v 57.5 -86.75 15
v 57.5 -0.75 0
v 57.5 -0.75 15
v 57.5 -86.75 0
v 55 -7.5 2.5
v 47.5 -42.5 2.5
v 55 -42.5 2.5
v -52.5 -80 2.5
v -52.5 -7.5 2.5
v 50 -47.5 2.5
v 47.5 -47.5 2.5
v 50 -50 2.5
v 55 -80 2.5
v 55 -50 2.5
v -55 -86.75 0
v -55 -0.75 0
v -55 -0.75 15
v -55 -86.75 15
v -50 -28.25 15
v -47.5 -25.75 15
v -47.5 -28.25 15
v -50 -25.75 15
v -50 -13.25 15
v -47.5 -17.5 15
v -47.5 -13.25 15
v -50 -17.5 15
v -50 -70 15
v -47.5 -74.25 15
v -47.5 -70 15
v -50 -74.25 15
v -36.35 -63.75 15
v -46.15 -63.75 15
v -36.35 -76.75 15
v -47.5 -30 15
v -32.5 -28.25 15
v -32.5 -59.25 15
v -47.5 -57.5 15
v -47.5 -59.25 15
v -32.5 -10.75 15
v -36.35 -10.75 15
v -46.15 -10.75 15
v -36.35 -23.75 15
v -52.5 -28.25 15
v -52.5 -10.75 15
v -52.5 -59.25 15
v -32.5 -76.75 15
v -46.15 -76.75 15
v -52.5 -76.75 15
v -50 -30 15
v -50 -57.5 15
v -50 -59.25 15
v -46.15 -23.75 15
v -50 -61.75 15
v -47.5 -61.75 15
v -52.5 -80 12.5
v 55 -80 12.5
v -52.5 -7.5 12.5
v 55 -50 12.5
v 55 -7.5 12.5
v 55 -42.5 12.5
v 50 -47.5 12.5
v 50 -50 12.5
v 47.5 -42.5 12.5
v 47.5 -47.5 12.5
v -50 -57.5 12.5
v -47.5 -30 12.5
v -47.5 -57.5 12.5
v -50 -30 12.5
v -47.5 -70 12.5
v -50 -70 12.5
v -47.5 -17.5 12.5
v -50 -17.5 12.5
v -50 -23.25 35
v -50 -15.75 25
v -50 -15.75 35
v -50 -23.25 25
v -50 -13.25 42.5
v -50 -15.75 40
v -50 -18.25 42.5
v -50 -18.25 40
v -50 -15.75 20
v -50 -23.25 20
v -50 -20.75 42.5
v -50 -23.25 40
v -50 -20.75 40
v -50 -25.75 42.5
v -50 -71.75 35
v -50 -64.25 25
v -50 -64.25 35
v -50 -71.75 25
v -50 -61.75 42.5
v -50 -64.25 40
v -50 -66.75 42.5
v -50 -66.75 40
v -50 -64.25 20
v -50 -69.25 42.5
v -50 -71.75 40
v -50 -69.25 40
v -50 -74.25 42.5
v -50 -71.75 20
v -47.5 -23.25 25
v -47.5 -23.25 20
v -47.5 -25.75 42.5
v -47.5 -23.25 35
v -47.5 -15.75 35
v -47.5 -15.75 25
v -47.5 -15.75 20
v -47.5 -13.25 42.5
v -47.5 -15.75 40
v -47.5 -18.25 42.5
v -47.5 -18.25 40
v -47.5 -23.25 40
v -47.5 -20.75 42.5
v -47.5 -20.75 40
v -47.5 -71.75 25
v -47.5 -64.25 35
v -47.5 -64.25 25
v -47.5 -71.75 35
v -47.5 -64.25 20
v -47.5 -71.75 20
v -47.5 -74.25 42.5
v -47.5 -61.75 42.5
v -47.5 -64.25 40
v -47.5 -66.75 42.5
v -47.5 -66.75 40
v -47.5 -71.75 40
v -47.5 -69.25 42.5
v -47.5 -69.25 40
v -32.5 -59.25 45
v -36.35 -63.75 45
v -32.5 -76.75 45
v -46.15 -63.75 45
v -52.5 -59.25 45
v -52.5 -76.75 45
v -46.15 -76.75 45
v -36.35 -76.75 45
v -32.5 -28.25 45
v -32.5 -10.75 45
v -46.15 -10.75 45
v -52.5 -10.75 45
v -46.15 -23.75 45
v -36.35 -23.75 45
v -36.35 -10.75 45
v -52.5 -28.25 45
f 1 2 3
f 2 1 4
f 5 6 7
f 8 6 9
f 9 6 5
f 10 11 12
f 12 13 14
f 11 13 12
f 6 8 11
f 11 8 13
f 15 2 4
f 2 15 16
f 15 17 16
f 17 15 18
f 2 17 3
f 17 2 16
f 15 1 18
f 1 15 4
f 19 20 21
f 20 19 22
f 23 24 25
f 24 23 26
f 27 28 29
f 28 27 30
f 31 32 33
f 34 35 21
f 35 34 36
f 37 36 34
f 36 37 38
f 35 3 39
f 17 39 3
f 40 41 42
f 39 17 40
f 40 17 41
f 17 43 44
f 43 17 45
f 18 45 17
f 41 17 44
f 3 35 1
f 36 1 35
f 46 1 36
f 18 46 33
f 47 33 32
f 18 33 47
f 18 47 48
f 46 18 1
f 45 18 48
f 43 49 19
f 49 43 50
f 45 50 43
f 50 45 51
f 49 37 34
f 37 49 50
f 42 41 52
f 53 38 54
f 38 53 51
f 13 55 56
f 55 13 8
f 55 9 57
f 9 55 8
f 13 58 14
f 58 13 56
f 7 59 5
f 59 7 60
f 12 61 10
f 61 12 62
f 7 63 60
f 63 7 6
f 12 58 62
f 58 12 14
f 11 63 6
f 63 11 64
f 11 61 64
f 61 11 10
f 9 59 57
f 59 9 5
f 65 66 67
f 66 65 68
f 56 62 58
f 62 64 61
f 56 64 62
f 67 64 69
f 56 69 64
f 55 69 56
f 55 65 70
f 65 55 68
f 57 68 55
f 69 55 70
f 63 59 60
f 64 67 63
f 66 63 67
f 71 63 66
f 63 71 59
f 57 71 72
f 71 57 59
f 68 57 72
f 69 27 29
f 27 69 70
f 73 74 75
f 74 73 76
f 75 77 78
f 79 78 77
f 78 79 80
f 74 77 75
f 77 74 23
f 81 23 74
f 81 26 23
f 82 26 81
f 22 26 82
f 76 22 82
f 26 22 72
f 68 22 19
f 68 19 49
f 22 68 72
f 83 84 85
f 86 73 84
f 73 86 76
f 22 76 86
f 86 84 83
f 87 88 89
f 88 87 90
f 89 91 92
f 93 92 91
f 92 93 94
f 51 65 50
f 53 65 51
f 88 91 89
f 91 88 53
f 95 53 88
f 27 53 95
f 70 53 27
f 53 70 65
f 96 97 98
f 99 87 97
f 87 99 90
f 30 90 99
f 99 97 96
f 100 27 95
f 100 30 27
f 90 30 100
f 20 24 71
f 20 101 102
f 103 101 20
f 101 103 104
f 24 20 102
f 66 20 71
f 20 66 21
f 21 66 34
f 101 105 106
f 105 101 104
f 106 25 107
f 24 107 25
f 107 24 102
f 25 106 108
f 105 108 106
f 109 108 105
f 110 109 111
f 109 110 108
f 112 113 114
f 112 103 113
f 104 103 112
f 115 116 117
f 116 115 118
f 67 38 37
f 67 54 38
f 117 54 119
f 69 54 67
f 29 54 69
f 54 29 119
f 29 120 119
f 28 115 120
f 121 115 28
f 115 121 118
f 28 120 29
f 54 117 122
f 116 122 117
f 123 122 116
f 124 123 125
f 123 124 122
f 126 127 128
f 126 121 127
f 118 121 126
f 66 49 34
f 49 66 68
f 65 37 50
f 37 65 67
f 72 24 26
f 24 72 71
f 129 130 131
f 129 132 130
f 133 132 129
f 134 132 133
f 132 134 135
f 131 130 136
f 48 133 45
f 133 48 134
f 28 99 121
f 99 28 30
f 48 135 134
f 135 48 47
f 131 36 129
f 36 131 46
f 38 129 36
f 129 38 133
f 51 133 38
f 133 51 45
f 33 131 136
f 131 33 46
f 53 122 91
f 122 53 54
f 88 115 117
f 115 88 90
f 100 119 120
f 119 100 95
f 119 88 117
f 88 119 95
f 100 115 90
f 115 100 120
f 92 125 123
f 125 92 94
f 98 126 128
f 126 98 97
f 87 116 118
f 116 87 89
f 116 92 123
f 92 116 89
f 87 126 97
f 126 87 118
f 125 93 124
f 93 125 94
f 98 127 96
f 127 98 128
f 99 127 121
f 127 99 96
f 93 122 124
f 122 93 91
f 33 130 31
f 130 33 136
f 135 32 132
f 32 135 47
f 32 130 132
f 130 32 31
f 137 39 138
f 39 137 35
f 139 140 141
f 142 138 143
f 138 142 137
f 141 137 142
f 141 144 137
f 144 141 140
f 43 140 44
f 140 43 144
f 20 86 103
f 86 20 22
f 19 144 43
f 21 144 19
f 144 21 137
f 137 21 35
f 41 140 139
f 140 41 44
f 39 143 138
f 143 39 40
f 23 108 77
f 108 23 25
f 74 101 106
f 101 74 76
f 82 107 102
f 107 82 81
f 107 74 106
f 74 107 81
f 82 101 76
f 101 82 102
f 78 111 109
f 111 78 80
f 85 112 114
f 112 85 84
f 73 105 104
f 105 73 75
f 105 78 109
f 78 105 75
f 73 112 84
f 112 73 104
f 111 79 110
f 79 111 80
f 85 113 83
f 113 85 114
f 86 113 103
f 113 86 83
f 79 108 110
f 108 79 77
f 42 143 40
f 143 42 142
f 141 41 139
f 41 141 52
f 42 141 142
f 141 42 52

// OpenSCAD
// Parametric cube-mesh reconstruction from base_voxels.scad (merged cubes, not voxels)
pitch = 2.5;

// tower_spacing is measured between the *inner edges* of the rectangular holes
// (i.e., from the hole face closest to the center gap on tower A to the corresponding face on tower B).
// Increasing tower_spacing also lengthens the base in the tower_dir direction.
tower_dir = [0, 1, 0];                 // direction from tower0 -> tower1
hole_dims = [9.8, 13.5, 35];           // (x,y,z) size of the cutout inside each tower
hole_offset = [0,0,0];                 // additional offset applied to the hole center (world axes)

// --- derived constants from the original imported geometry ---
base_gap_hole_centers = 45.0;          // original (tower1 hole center Y - tower0 hole center Y), along tower_dir
orig_hole_edge_spacing = base_gap_hole_centers - hole_dims[1];

// user-facing parameter (inner-edge-to-inner-edge spacing)
tower_spacing = 40;//orig_hole_edge_spacing;

base_boxes = [
  [-55, -82.5, 0, 112.5, 77.5, 2.5],
  [-55, -82.5, 2.5, 112.5, 2.5, 12.5],
  [-55, -80, 2.5, 2.5, 75, 12.5],
  [55, -80, 2.5, 2.5, 75, 12.5],
  [50, -50, 2.5, 5, 7.5, 12.5],
  [47.5, -47.5, 2.5, 2.5, 5, 12.5],
  [-52.5, -7.5, 2.5, 107.5, 2.5, 12.5],
  [-52.5, -80, 12.5, 107.5, 10, 2.5],
  [-52.5, -70, 12.5, 2.5, 62.5, 2.5],
  [-47.5, -70, 12.5, 102.5, 20, 2.5],
  [-50, -57.5, 12.5, 2.5, 27.5, 2.5],
  [-47.5, -50, 12.5, 97.5, 2.5, 2.5],
  [-47.5, -47.5, 12.5, 95, 40, 2.5],
  [47.5, -42.5, 12.5, 7.5, 35, 2.5],
  [-50, -17.5, 12.5, 2.5, 10, 2.5],
];
orig_base_min_y = -82.5;
orig_base_max_y = -5.0;
eps = 0.01;

// Extend base boxes along tower_dir (Y) when tower spacing increases.
// Boxes that touch the original min/max Y get extended by half on that side.
// Boxes that touch both ends get extended by the full amount.
function extend_base_box(b, ext) =
    let(y0=b[1], dy=b[4], y1=y0+dy,
        touch_min = abs(y0 - orig_base_min_y) < eps,
        touch_max = abs(y1 - orig_base_max_y) < eps)
    touch_min && touch_max ? [b[0], y0 - ext/2, b[2], b[3], dy + ext,   b[5]] :
    touch_min            ? [b[0], y0 - ext/2, b[2], b[3], dy + ext/2, b[5]] :
    touch_max            ? [b[0], y0,         b[2], b[3], dy + ext/2, b[5]] :
                             b;

tower0_boxes = [
  [-52.5, -72.5, 15, 7.5, 2.5, 30],
  [-37.5, -72.5, 15, 5, 17.5, 30],
  [-52.5, -70, 15, 2.5, 15, 30],
  [-47.5, -70, 15, 2.5, 15, 30],
  [-45, -60, 15, 7.5, 5, 30],
  [-50, -57.5, 15, 2.5, 2.5, 30],
  [-50, -67.5, 20, 2.5, 7.5, 5],
  [-50, -67.5, 35, 2.5, 7.5, 5],
  [-50, -65, 40, 2.5, 2.5, 5],
  [-50, -70, 42.5, 2.5, 5, 2.5],
  [-50, -62.5, 42.5, 2.5, 5, 2.5],
];
tower1_boxes = [
  [-52.5, -32.5, 15, 20, 2.5, 30],
  [-52.5, -30, 15, 2.5, 15, 30],
  [-47.5, -30, 15, 15, 2.5, 30],
  [-47.5, -27.5, 15, 2.5, 12.5, 30],
  [-37.5, -27.5, 15, 5, 12.5, 30],
  [-50, -17.5, 15, 2.5, 2.5, 30],
  [-50, -27.5, 20, 2.5, 7.5, 5],
  [-50, -27.5, 35, 2.5, 7.5, 5],
  [-50, -25, 40, 2.5, 2.5, 5],
  [-50, -30, 42.5, 2.5, 5, 2.5],
  [-50, -22.5, 42.5, 2.5, 5, 2.5],
];
tower0_center = [-42.417, -62.750, 30.178];
tower1_center = [-42.417, -24.750, 30.178];
tower0_hole_rel = [1.167, -3.500, 0.000];
tower1_hole_rel = [1.167, 3.500, 0.000];


module draw_boxes(B) {
  for (b = B) {
    translate([b[0], b[1], b[2]]) cube([b[3], b[4], b[5]], center=false);
  }
}

module tower(B, tower_center, hole_rel) {
  difference() {
    draw_boxes(B);
    translate(tower_center + hole_rel + hole_offset)
      cube(hole_dims, center=true);
  }
}

module model() {
  // Compute how much to separate the towers (and extend the base) to achieve the requested
  // inner-edge-to-inner-edge hole spacing.
  sep_needed = (tower_spacing + hole_dims[1]) - base_gap_hole_centers;  // additional separation between hole centers
  shift_amt = sep_needed / 2;
  shift = [tower_dir[0]*shift_amt, tower_dir[1]*shift_amt, tower_dir[2]*shift_amt];

  // Extend the base along Y by the same total additional separation (sep_needed).
  base_boxes_ext = [for (b = base_boxes) extend_base_box(b, sep_needed)];
  draw_boxes(base_boxes_ext);


  translate(-shift) tower(tower0_boxes, tower0_center, tower0_hole_rel);
  translate( shift) tower(tower1_boxes, tower1_center, tower1_hole_rel);
}

model();
